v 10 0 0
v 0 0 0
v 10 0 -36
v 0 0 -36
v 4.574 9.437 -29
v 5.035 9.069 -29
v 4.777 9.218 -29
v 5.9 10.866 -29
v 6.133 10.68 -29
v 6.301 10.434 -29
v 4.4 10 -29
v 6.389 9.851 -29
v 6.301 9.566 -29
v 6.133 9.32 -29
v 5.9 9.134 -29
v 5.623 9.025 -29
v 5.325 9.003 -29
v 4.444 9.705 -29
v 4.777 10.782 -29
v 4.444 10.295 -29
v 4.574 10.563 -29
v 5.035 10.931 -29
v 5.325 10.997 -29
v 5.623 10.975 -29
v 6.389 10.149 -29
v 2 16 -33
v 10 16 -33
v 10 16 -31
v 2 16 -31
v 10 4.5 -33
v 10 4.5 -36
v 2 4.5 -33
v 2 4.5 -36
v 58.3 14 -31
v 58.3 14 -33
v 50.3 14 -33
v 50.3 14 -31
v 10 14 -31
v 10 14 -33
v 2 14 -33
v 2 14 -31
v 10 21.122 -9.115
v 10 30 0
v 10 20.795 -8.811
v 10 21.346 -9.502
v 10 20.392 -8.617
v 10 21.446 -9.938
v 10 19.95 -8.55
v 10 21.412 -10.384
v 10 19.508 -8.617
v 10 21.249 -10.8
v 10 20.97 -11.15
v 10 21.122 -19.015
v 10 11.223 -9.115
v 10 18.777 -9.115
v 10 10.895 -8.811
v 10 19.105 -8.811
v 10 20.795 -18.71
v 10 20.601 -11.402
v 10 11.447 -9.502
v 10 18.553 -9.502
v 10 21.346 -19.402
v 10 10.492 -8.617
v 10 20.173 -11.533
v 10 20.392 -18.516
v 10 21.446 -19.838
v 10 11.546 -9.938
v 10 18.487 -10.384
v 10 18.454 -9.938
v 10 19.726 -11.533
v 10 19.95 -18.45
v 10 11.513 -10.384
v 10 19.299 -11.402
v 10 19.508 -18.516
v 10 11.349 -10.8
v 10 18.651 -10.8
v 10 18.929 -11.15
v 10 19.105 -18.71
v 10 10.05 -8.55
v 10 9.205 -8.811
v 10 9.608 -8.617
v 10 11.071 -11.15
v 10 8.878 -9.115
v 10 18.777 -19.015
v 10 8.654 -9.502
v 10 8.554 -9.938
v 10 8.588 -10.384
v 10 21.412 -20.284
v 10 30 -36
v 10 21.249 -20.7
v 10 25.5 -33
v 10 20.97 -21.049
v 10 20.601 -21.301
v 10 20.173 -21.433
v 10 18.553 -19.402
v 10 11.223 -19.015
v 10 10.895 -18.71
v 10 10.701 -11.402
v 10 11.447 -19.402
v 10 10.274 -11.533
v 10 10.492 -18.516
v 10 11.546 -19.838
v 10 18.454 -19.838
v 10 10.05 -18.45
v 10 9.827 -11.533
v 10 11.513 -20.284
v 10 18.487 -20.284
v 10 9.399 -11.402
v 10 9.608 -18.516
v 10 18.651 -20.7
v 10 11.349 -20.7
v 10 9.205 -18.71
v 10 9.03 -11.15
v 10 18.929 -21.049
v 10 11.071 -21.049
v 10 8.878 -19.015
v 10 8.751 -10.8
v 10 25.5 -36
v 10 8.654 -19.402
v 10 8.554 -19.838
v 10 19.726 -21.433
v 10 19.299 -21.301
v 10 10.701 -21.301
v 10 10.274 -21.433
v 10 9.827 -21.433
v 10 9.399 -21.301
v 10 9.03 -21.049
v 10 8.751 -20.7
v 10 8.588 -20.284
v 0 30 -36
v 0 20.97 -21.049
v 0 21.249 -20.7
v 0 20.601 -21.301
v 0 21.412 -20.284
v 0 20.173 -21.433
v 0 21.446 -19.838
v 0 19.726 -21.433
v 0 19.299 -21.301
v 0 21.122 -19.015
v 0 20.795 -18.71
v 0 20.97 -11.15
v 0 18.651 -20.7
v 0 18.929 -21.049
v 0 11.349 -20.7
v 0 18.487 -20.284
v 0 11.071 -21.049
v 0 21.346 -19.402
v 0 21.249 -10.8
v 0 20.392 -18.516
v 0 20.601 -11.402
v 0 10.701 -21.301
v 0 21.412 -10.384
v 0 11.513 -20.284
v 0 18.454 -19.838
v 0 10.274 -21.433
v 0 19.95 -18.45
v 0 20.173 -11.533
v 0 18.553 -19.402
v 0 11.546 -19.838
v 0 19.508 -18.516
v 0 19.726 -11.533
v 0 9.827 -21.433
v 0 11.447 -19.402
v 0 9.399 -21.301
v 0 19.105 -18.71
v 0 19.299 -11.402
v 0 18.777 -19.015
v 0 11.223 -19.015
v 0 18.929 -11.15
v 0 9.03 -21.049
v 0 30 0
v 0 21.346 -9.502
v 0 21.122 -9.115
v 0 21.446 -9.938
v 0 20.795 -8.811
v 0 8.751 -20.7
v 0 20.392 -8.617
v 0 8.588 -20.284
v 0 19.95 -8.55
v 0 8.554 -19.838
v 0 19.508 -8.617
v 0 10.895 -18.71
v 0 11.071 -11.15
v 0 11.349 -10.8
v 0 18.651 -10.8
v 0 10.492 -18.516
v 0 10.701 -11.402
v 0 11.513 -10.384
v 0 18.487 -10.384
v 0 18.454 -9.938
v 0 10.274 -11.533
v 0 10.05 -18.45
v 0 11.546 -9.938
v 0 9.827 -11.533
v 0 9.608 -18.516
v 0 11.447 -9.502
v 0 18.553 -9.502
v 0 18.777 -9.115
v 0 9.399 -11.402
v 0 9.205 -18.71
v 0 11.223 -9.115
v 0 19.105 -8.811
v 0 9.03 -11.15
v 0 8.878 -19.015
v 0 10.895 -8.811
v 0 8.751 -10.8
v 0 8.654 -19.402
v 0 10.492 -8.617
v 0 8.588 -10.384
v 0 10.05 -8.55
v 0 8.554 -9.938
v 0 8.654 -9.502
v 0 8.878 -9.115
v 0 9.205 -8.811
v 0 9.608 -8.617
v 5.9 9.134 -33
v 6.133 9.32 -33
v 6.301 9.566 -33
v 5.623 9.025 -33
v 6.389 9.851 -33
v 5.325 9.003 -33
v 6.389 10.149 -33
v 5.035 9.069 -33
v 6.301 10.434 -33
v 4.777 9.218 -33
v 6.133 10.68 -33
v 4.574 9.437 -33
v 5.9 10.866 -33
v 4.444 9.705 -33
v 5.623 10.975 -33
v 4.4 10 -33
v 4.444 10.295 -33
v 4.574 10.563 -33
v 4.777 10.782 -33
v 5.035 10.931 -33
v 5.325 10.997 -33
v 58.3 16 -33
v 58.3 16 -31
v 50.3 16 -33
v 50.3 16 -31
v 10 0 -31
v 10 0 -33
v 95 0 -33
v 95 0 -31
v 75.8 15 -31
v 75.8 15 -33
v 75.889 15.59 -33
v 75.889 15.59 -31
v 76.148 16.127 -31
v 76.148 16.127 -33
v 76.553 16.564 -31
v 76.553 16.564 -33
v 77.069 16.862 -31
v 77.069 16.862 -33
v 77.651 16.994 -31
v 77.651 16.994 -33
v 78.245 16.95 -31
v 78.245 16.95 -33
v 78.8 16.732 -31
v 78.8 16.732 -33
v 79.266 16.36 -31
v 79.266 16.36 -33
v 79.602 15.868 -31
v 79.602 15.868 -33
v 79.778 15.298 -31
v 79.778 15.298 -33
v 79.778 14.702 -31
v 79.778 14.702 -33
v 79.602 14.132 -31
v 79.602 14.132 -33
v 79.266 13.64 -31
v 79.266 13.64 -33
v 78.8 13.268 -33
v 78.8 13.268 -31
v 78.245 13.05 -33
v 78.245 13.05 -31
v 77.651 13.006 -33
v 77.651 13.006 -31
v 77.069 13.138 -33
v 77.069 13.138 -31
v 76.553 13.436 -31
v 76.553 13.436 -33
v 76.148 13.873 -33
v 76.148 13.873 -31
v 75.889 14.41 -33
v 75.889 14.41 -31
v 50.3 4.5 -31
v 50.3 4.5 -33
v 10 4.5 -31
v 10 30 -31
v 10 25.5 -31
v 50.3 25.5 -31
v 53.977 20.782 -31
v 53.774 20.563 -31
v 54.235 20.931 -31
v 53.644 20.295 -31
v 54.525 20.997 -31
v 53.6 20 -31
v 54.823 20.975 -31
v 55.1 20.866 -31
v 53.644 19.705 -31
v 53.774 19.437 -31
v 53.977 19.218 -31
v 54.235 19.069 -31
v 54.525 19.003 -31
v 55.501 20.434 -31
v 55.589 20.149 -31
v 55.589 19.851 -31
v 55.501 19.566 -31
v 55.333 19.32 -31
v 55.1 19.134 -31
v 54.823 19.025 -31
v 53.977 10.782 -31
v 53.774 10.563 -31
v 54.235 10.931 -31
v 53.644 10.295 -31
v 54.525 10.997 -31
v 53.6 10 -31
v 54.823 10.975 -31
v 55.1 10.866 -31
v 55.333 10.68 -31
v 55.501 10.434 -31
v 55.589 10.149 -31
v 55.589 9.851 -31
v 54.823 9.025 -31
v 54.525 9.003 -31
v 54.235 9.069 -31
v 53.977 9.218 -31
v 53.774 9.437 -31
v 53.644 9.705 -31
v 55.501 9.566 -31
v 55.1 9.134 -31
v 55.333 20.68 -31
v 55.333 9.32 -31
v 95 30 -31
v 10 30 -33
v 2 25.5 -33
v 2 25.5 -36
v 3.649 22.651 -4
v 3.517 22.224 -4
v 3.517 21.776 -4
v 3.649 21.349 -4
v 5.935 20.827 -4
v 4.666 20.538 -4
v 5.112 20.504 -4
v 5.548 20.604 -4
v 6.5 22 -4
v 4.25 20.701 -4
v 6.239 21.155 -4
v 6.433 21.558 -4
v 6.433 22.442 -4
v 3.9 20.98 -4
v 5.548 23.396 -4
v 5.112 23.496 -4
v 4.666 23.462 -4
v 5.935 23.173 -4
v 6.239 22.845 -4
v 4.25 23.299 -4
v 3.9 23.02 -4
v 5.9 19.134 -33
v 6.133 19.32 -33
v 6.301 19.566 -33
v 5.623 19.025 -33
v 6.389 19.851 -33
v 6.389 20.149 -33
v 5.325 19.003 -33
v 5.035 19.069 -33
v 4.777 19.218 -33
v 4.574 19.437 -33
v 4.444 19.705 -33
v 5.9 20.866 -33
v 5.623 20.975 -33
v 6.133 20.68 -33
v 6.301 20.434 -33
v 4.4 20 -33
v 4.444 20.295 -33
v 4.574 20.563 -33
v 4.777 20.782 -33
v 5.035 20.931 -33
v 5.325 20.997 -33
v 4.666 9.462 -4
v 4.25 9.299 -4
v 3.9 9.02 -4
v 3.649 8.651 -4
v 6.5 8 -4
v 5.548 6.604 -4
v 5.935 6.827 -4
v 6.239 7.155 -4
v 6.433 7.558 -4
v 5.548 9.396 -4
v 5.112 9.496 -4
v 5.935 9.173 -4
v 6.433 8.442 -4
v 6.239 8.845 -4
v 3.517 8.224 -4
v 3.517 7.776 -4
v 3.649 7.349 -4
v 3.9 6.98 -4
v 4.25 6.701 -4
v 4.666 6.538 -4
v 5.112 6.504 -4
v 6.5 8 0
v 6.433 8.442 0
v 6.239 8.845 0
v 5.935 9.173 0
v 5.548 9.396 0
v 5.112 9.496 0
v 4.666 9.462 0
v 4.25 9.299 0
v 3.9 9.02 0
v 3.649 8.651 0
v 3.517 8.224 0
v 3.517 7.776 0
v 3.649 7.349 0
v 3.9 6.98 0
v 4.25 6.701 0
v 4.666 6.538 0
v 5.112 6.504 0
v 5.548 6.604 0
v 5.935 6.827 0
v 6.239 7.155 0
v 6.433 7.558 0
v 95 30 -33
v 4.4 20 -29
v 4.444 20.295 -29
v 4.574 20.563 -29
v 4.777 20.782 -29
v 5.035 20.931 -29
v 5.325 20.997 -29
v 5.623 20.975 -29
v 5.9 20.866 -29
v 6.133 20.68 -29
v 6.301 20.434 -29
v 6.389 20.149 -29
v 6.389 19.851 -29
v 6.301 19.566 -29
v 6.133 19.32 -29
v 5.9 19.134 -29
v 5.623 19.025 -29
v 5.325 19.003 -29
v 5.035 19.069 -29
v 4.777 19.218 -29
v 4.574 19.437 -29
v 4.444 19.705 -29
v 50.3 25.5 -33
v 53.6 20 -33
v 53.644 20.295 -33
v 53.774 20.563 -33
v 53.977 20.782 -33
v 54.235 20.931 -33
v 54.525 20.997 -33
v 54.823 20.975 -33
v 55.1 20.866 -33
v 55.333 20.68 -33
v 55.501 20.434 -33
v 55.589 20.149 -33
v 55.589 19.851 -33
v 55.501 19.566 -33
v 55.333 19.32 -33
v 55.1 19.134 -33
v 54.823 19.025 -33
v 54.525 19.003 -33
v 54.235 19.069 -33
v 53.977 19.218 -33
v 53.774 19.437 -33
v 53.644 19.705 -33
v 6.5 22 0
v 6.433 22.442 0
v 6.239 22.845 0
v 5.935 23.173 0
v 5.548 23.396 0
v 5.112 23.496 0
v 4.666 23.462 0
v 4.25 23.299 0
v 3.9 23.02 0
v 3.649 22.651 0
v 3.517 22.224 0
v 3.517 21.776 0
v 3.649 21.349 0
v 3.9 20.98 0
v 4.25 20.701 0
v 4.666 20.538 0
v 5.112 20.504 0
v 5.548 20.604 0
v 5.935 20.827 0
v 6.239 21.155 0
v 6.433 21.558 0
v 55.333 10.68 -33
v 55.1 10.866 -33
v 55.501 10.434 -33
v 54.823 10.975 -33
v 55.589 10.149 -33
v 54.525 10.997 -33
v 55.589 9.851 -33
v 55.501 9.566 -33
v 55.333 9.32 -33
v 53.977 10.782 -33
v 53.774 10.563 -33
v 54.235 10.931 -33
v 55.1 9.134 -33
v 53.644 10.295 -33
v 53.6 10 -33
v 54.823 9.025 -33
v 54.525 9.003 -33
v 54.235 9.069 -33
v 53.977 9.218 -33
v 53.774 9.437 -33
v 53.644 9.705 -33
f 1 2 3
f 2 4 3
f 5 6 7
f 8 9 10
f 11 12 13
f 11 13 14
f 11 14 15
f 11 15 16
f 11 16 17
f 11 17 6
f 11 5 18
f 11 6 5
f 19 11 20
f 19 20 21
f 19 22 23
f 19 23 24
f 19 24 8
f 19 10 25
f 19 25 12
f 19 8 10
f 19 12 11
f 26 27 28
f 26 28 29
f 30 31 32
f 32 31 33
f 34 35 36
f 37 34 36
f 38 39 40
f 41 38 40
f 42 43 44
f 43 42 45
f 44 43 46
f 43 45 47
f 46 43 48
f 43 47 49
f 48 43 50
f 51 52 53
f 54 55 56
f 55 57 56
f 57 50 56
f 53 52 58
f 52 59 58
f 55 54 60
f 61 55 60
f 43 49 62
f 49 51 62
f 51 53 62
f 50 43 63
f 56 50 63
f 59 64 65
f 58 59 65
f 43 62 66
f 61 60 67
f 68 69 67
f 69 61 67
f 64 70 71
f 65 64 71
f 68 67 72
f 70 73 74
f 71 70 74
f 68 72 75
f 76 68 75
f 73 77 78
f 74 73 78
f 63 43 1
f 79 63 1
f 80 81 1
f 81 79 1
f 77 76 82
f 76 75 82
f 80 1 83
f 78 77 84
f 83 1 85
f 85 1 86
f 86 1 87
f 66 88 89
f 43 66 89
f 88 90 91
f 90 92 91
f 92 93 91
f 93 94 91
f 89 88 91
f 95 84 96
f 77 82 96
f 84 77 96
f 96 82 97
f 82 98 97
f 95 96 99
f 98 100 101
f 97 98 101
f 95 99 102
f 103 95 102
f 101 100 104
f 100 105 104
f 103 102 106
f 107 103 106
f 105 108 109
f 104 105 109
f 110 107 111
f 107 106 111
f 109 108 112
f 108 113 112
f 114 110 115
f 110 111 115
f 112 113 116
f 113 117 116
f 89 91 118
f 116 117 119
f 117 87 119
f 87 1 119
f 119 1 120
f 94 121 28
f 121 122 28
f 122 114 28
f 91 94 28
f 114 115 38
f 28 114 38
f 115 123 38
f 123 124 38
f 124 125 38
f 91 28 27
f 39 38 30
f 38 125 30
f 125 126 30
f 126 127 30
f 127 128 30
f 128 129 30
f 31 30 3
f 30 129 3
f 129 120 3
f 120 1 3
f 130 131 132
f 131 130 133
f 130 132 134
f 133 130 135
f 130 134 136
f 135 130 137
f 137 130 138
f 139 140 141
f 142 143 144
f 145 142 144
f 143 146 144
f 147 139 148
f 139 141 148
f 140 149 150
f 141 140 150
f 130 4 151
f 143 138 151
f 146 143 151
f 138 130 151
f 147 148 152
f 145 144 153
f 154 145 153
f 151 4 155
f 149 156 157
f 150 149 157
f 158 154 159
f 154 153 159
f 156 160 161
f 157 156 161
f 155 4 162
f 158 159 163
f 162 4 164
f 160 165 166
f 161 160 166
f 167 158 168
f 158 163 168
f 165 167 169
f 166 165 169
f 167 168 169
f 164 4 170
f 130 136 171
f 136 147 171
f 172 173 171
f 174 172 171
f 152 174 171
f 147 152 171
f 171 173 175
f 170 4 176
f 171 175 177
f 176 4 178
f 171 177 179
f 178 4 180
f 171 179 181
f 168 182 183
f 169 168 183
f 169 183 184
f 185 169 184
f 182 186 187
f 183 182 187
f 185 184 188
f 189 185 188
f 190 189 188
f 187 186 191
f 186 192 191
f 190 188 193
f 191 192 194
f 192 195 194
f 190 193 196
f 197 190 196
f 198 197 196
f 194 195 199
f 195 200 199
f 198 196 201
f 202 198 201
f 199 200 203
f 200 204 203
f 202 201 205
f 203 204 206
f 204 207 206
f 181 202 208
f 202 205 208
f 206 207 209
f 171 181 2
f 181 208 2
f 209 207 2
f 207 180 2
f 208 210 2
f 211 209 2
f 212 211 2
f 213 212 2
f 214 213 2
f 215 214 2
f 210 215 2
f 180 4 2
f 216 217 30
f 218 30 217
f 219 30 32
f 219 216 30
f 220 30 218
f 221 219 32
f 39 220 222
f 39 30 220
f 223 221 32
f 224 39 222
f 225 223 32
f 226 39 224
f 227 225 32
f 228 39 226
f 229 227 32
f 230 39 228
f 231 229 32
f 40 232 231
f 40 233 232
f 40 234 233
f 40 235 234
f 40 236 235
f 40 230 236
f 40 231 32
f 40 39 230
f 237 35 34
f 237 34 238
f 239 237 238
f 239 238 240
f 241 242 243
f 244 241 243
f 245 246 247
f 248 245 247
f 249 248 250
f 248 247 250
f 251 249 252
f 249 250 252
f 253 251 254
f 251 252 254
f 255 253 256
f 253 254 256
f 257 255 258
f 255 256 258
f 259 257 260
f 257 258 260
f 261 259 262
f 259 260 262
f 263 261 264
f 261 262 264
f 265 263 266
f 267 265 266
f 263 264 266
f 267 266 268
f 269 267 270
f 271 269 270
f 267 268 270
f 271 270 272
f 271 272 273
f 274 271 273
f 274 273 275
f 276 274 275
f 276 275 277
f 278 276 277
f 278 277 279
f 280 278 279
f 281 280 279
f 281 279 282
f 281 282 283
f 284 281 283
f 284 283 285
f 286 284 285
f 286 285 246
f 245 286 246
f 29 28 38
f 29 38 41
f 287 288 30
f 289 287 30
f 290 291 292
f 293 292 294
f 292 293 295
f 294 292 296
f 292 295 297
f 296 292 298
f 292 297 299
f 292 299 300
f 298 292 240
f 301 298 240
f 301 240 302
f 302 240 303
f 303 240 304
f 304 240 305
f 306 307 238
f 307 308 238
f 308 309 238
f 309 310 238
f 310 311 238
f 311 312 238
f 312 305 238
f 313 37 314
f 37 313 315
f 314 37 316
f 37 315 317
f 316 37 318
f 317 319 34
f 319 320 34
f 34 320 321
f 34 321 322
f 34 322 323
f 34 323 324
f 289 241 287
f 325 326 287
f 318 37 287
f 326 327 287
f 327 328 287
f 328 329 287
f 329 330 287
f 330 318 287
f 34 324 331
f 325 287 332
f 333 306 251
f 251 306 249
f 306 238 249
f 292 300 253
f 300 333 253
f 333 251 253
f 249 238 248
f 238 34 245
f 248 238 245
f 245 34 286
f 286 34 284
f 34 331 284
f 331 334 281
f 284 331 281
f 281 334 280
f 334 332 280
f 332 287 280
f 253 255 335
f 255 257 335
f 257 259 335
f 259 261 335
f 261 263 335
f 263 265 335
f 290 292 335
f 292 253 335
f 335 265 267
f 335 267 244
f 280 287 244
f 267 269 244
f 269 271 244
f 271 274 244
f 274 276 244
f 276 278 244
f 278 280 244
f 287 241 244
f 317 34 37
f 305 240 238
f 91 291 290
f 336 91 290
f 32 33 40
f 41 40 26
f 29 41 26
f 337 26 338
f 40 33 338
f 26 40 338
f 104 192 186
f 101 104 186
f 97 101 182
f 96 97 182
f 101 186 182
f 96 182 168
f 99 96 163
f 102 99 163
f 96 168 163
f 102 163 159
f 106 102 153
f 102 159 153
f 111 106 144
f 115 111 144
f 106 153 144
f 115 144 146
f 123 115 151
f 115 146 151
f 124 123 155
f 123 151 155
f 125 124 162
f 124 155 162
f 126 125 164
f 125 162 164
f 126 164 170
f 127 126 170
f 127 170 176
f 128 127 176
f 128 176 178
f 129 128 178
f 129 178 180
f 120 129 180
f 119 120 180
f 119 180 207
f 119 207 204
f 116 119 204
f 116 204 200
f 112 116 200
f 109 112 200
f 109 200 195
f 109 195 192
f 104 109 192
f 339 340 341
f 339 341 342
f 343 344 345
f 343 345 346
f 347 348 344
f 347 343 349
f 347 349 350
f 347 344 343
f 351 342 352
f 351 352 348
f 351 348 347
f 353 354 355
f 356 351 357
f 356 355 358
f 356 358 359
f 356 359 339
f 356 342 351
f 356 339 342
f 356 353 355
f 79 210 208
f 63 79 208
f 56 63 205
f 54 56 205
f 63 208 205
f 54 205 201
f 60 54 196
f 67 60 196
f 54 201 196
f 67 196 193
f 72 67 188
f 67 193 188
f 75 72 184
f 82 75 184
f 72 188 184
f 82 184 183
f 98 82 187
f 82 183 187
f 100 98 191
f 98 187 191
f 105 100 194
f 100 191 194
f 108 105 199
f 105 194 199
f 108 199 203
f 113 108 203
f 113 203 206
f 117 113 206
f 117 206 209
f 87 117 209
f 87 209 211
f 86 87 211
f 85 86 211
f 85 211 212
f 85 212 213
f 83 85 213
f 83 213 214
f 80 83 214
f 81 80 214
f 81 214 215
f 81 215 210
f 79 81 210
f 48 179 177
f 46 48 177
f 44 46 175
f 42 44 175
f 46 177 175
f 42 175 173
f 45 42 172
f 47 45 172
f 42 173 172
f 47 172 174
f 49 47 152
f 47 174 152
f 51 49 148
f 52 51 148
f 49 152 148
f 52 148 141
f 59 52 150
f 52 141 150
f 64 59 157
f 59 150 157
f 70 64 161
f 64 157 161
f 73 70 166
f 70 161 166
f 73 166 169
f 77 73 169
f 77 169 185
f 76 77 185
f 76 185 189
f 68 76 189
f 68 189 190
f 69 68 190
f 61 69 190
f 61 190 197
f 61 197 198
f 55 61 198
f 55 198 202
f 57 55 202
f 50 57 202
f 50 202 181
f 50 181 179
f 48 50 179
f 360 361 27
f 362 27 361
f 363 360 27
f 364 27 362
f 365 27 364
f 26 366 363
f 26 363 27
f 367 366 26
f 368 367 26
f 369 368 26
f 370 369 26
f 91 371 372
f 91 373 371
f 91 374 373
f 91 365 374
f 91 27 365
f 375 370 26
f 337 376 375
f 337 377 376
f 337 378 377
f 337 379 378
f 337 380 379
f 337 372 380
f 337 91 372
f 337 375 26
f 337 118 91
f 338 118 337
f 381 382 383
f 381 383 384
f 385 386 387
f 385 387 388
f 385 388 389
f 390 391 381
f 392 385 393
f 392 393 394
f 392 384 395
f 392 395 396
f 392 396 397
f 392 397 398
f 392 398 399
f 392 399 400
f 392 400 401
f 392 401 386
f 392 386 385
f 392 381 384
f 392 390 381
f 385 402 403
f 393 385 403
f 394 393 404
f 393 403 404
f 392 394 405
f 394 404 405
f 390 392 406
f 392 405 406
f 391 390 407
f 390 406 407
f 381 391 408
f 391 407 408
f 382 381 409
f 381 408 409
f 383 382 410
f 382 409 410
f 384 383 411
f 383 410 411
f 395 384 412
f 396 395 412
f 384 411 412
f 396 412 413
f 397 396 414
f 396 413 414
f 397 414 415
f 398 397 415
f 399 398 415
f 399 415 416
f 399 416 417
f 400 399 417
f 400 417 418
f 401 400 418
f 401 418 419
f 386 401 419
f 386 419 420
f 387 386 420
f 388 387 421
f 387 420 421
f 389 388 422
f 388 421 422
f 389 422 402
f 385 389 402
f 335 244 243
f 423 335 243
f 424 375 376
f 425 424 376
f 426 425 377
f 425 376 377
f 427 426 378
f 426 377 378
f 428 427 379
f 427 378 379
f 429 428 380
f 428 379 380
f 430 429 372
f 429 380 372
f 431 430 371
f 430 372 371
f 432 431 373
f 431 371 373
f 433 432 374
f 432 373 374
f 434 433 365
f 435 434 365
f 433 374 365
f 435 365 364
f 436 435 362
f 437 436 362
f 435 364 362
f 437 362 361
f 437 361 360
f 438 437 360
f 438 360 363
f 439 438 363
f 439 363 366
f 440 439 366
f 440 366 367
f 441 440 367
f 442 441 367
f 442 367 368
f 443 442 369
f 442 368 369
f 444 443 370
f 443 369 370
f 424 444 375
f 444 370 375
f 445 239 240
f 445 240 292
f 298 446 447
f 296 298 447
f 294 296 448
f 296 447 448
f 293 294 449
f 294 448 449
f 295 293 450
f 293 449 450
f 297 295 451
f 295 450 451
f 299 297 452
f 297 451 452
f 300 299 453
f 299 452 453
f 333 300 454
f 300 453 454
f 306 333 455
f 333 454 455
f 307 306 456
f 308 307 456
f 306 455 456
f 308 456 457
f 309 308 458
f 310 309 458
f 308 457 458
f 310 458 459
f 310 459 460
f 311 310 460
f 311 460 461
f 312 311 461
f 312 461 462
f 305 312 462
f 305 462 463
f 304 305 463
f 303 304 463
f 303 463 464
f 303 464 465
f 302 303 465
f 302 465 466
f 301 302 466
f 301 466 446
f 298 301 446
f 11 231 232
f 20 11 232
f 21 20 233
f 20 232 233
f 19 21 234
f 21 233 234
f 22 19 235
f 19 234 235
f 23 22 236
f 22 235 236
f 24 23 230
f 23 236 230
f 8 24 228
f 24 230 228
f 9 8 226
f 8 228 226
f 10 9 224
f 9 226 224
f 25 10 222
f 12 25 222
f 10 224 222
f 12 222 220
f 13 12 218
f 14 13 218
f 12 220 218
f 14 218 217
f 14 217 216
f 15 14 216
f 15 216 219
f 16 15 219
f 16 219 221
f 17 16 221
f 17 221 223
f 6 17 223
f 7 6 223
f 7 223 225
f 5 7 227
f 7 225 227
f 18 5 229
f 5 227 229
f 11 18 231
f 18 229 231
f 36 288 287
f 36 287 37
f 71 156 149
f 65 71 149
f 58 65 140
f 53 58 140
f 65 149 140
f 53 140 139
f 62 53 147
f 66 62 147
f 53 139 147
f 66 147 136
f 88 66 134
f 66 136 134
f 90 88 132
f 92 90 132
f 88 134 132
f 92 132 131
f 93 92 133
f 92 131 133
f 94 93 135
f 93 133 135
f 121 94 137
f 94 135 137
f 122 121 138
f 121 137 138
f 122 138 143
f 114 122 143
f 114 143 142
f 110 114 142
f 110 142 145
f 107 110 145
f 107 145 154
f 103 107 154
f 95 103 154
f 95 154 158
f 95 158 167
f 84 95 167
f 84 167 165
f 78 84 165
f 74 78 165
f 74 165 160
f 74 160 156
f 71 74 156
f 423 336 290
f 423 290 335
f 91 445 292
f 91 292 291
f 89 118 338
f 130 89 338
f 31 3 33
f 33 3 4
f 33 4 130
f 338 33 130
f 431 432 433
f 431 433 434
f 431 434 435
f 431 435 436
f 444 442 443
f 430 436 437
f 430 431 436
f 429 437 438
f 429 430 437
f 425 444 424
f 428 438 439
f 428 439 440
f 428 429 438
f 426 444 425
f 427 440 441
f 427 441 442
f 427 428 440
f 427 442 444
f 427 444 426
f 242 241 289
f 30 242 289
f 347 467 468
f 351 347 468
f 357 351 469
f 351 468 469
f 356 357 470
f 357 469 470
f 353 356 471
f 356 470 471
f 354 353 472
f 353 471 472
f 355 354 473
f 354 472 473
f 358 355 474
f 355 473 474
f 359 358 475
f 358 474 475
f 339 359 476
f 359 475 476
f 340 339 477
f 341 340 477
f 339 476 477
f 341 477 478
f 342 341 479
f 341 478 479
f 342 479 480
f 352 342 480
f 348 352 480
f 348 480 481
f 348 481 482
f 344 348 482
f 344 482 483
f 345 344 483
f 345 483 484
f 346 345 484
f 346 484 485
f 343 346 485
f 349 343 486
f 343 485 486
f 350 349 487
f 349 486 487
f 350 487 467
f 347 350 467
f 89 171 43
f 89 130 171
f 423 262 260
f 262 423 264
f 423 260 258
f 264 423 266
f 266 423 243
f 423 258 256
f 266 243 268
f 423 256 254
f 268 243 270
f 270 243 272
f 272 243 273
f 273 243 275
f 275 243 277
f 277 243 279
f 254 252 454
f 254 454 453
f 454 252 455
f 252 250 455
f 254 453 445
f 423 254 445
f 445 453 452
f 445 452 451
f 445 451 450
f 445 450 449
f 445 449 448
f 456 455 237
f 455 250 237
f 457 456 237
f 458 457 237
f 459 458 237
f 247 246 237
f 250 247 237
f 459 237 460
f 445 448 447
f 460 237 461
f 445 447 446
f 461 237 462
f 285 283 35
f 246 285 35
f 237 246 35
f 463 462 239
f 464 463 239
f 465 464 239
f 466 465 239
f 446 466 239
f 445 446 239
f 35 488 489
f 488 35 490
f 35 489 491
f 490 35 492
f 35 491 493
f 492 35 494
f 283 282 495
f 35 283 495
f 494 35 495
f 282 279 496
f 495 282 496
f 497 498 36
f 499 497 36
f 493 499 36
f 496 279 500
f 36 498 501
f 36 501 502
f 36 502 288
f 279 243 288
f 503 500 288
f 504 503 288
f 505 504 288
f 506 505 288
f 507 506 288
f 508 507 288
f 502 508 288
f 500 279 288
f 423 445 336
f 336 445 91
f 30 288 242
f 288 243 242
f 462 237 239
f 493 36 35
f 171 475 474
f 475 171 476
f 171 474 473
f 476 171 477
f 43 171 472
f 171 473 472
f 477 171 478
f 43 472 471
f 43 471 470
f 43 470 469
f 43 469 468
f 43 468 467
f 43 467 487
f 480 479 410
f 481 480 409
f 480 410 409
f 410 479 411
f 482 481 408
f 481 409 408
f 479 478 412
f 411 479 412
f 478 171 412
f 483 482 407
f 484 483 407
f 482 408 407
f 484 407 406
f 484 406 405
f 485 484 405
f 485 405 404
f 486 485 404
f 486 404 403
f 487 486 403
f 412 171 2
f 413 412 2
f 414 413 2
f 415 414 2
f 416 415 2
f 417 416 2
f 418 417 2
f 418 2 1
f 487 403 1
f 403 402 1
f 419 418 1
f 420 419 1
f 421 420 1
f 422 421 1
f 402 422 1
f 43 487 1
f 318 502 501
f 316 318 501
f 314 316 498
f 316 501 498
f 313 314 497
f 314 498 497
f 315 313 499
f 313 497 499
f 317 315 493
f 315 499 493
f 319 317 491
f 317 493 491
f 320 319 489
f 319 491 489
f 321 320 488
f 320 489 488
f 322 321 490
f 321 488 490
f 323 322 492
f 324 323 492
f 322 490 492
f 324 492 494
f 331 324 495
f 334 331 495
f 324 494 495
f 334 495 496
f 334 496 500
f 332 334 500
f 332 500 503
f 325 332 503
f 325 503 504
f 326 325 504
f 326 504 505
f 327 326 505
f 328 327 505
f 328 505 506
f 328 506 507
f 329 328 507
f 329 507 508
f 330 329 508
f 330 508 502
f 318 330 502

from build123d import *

# Parameters (mm, degrees)
EXTRUDE_1_DEPTH     = 30
SKETCH_2_R          = 1.5
CUT_EXTRUDE_1_DEPTH = 106.929221653
SKETCH_3_W          = 40.3
SKETCH_3_H          = 21
CUT_EXTRUDE_2_DEPTH = 106.929221653
SKETCH_4_W          = 8
SKETCH_4_H          = 21
CUT_EXTRUDE_3_DEPTH = 3
SKETCH_5_W          = 56.3
SKETCH_5_H          = 2
CUT_EXTRUDE_4_DEPTH = 5
SKETCH_6_R          = 1
CUT_EXTRUDE_5_DEPTH = 4
SKETCH_7_R          = 2
CUT_EXTRUDE_6_DEPTH = 106.929221653
SKETCH_8_R          = 1.5
CUT_EXTRUDE_7_DEPTH = 4


with BuildPart() as part:
    # Эскиз1 → Бобышка-Вытянуть1 (new body)
    with BuildSketch(Plane(origin=(0, 0, 0), x_dir=(1, 0, 0), z_dir=(0, 1, 0))):
        Polygon((0, 0), (10, 0), (10, 31), (95, 31), (95, 33), (10, 33), (10, 36), (0, 36), align=None)
    extrude(amount=EXTRUDE_1_DEPTH)

    # Эскиз2 → Вырез-Вытянуть1 (cut, through all)
    with BuildSketch(Plane.ZY):
        with Locations((-19.949747468, 19.949747468)):
            Circle(SKETCH_2_R)
        with Locations((-10.050252532, 19.949747468)):
            Circle(SKETCH_2_R)
        with Locations((-19.949747468, 10.050252532)):
            Circle(SKETCH_2_R)
        with Locations((-10.050252532, 10.050252532)):
            Circle(SKETCH_2_R)
    extrude(amount=-CUT_EXTRUDE_1_DEPTH, mode=Mode.SUBTRACT)

    # Эскиз3 → Вырез-Вытянуть2 (cut, through all)
    with BuildSketch(Plane(origin=(0, 0, -36), x_dir=(-1, 0, 0), z_dir=(0, 0, -1))):
        with Locations((-30.15, 15)):
            Rectangle(SKETCH_3_W, SKETCH_3_H)
    extrude(amount=-CUT_EXTRUDE_2_DEPTH, mode=Mode.SUBTRACT)

    # Эскиз4 → Вырез-Вытянуть3 (cut)
    with BuildSketch(Plane(origin=(0, 0, -36), x_dir=(-1, 0, 0), z_dir=(0, 0, -1))):
        with Locations((-6, 15)):
            Rectangle(SKETCH_4_W, SKETCH_4_H)
    extrude(amount=-CUT_EXTRUDE_3_DEPTH, mode=Mode.SUBTRACT)

    # Эскиз5 → Вырез-Вытянуть4 (cut)
    with BuildSketch(Plane(origin=(0, 0, -36), x_dir=(-1, 0, 0), z_dir=(0, 0, -1))):
        with Locations((-30.15, 15)):
            Rectangle(SKETCH_5_W, SKETCH_5_H)
    extrude(amount=-CUT_EXTRUDE_4_DEPTH, mode=Mode.SUBTRACT)

    # Эскиз6 → Вырез-Вытянуть5 (cut)
    with BuildSketch(Plane(origin=(0, 0, -33), x_dir=(-1, 0, 0), z_dir=(0, 0, -1))):
        with Locations((-5.4, 10)):
            Circle(SKETCH_6_R)
        with Locations((-54.6, 10)):
            Circle(SKETCH_6_R)
        with Locations((-5.4, 20)):
            Circle(SKETCH_6_R)
        with Locations((-54.6, 20)):
            Circle(SKETCH_6_R)
    extrude(amount=-CUT_EXTRUDE_5_DEPTH, mode=Mode.SUBTRACT)

    # Эскиз7 → Вырез-Вытянуть6 (cut, through all)
    with BuildSketch(Plane(origin=(0, 0, -36), x_dir=(-1, 0, 0), z_dir=(0, 0, -1))):
        with Locations((-77.8, 15)):
            Circle(SKETCH_7_R)
    extrude(amount=-CUT_EXTRUDE_6_DEPTH, mode=Mode.SUBTRACT)

    # Эскиз8 → Вырез-Вытянуть7 (cut)
    with BuildSketch(Plane.XY):
        with Locations((5, 22)):
            Circle(SKETCH_8_R)
        with Locations((5, 8)):
            Circle(SKETCH_8_R)
    extrude(amount=-CUT_EXTRUDE_7_DEPTH, mode=Mode.SUBTRACT)


with BuildPart() as body_2:
    # Split Bodies 1: the piece on the far side of the plane
    add(part.part)
    split(bisect_by=Plane(origin=(10, 30, 0), x_dir=(0, 0, -1), z_dir=(-1, 0, 0)), keep=Keep.BOTTOM)


with BuildPart() as part_1:
    add(part.part)

    # Split Bodies 1
    split(bisect_by=Plane(origin=(10, 30, 0), x_dir=(0, 0, -1), z_dir=(-1, 0, 0)), keep=Keep.TOP)


solid = Compound([body_2.part, part_1.part])
